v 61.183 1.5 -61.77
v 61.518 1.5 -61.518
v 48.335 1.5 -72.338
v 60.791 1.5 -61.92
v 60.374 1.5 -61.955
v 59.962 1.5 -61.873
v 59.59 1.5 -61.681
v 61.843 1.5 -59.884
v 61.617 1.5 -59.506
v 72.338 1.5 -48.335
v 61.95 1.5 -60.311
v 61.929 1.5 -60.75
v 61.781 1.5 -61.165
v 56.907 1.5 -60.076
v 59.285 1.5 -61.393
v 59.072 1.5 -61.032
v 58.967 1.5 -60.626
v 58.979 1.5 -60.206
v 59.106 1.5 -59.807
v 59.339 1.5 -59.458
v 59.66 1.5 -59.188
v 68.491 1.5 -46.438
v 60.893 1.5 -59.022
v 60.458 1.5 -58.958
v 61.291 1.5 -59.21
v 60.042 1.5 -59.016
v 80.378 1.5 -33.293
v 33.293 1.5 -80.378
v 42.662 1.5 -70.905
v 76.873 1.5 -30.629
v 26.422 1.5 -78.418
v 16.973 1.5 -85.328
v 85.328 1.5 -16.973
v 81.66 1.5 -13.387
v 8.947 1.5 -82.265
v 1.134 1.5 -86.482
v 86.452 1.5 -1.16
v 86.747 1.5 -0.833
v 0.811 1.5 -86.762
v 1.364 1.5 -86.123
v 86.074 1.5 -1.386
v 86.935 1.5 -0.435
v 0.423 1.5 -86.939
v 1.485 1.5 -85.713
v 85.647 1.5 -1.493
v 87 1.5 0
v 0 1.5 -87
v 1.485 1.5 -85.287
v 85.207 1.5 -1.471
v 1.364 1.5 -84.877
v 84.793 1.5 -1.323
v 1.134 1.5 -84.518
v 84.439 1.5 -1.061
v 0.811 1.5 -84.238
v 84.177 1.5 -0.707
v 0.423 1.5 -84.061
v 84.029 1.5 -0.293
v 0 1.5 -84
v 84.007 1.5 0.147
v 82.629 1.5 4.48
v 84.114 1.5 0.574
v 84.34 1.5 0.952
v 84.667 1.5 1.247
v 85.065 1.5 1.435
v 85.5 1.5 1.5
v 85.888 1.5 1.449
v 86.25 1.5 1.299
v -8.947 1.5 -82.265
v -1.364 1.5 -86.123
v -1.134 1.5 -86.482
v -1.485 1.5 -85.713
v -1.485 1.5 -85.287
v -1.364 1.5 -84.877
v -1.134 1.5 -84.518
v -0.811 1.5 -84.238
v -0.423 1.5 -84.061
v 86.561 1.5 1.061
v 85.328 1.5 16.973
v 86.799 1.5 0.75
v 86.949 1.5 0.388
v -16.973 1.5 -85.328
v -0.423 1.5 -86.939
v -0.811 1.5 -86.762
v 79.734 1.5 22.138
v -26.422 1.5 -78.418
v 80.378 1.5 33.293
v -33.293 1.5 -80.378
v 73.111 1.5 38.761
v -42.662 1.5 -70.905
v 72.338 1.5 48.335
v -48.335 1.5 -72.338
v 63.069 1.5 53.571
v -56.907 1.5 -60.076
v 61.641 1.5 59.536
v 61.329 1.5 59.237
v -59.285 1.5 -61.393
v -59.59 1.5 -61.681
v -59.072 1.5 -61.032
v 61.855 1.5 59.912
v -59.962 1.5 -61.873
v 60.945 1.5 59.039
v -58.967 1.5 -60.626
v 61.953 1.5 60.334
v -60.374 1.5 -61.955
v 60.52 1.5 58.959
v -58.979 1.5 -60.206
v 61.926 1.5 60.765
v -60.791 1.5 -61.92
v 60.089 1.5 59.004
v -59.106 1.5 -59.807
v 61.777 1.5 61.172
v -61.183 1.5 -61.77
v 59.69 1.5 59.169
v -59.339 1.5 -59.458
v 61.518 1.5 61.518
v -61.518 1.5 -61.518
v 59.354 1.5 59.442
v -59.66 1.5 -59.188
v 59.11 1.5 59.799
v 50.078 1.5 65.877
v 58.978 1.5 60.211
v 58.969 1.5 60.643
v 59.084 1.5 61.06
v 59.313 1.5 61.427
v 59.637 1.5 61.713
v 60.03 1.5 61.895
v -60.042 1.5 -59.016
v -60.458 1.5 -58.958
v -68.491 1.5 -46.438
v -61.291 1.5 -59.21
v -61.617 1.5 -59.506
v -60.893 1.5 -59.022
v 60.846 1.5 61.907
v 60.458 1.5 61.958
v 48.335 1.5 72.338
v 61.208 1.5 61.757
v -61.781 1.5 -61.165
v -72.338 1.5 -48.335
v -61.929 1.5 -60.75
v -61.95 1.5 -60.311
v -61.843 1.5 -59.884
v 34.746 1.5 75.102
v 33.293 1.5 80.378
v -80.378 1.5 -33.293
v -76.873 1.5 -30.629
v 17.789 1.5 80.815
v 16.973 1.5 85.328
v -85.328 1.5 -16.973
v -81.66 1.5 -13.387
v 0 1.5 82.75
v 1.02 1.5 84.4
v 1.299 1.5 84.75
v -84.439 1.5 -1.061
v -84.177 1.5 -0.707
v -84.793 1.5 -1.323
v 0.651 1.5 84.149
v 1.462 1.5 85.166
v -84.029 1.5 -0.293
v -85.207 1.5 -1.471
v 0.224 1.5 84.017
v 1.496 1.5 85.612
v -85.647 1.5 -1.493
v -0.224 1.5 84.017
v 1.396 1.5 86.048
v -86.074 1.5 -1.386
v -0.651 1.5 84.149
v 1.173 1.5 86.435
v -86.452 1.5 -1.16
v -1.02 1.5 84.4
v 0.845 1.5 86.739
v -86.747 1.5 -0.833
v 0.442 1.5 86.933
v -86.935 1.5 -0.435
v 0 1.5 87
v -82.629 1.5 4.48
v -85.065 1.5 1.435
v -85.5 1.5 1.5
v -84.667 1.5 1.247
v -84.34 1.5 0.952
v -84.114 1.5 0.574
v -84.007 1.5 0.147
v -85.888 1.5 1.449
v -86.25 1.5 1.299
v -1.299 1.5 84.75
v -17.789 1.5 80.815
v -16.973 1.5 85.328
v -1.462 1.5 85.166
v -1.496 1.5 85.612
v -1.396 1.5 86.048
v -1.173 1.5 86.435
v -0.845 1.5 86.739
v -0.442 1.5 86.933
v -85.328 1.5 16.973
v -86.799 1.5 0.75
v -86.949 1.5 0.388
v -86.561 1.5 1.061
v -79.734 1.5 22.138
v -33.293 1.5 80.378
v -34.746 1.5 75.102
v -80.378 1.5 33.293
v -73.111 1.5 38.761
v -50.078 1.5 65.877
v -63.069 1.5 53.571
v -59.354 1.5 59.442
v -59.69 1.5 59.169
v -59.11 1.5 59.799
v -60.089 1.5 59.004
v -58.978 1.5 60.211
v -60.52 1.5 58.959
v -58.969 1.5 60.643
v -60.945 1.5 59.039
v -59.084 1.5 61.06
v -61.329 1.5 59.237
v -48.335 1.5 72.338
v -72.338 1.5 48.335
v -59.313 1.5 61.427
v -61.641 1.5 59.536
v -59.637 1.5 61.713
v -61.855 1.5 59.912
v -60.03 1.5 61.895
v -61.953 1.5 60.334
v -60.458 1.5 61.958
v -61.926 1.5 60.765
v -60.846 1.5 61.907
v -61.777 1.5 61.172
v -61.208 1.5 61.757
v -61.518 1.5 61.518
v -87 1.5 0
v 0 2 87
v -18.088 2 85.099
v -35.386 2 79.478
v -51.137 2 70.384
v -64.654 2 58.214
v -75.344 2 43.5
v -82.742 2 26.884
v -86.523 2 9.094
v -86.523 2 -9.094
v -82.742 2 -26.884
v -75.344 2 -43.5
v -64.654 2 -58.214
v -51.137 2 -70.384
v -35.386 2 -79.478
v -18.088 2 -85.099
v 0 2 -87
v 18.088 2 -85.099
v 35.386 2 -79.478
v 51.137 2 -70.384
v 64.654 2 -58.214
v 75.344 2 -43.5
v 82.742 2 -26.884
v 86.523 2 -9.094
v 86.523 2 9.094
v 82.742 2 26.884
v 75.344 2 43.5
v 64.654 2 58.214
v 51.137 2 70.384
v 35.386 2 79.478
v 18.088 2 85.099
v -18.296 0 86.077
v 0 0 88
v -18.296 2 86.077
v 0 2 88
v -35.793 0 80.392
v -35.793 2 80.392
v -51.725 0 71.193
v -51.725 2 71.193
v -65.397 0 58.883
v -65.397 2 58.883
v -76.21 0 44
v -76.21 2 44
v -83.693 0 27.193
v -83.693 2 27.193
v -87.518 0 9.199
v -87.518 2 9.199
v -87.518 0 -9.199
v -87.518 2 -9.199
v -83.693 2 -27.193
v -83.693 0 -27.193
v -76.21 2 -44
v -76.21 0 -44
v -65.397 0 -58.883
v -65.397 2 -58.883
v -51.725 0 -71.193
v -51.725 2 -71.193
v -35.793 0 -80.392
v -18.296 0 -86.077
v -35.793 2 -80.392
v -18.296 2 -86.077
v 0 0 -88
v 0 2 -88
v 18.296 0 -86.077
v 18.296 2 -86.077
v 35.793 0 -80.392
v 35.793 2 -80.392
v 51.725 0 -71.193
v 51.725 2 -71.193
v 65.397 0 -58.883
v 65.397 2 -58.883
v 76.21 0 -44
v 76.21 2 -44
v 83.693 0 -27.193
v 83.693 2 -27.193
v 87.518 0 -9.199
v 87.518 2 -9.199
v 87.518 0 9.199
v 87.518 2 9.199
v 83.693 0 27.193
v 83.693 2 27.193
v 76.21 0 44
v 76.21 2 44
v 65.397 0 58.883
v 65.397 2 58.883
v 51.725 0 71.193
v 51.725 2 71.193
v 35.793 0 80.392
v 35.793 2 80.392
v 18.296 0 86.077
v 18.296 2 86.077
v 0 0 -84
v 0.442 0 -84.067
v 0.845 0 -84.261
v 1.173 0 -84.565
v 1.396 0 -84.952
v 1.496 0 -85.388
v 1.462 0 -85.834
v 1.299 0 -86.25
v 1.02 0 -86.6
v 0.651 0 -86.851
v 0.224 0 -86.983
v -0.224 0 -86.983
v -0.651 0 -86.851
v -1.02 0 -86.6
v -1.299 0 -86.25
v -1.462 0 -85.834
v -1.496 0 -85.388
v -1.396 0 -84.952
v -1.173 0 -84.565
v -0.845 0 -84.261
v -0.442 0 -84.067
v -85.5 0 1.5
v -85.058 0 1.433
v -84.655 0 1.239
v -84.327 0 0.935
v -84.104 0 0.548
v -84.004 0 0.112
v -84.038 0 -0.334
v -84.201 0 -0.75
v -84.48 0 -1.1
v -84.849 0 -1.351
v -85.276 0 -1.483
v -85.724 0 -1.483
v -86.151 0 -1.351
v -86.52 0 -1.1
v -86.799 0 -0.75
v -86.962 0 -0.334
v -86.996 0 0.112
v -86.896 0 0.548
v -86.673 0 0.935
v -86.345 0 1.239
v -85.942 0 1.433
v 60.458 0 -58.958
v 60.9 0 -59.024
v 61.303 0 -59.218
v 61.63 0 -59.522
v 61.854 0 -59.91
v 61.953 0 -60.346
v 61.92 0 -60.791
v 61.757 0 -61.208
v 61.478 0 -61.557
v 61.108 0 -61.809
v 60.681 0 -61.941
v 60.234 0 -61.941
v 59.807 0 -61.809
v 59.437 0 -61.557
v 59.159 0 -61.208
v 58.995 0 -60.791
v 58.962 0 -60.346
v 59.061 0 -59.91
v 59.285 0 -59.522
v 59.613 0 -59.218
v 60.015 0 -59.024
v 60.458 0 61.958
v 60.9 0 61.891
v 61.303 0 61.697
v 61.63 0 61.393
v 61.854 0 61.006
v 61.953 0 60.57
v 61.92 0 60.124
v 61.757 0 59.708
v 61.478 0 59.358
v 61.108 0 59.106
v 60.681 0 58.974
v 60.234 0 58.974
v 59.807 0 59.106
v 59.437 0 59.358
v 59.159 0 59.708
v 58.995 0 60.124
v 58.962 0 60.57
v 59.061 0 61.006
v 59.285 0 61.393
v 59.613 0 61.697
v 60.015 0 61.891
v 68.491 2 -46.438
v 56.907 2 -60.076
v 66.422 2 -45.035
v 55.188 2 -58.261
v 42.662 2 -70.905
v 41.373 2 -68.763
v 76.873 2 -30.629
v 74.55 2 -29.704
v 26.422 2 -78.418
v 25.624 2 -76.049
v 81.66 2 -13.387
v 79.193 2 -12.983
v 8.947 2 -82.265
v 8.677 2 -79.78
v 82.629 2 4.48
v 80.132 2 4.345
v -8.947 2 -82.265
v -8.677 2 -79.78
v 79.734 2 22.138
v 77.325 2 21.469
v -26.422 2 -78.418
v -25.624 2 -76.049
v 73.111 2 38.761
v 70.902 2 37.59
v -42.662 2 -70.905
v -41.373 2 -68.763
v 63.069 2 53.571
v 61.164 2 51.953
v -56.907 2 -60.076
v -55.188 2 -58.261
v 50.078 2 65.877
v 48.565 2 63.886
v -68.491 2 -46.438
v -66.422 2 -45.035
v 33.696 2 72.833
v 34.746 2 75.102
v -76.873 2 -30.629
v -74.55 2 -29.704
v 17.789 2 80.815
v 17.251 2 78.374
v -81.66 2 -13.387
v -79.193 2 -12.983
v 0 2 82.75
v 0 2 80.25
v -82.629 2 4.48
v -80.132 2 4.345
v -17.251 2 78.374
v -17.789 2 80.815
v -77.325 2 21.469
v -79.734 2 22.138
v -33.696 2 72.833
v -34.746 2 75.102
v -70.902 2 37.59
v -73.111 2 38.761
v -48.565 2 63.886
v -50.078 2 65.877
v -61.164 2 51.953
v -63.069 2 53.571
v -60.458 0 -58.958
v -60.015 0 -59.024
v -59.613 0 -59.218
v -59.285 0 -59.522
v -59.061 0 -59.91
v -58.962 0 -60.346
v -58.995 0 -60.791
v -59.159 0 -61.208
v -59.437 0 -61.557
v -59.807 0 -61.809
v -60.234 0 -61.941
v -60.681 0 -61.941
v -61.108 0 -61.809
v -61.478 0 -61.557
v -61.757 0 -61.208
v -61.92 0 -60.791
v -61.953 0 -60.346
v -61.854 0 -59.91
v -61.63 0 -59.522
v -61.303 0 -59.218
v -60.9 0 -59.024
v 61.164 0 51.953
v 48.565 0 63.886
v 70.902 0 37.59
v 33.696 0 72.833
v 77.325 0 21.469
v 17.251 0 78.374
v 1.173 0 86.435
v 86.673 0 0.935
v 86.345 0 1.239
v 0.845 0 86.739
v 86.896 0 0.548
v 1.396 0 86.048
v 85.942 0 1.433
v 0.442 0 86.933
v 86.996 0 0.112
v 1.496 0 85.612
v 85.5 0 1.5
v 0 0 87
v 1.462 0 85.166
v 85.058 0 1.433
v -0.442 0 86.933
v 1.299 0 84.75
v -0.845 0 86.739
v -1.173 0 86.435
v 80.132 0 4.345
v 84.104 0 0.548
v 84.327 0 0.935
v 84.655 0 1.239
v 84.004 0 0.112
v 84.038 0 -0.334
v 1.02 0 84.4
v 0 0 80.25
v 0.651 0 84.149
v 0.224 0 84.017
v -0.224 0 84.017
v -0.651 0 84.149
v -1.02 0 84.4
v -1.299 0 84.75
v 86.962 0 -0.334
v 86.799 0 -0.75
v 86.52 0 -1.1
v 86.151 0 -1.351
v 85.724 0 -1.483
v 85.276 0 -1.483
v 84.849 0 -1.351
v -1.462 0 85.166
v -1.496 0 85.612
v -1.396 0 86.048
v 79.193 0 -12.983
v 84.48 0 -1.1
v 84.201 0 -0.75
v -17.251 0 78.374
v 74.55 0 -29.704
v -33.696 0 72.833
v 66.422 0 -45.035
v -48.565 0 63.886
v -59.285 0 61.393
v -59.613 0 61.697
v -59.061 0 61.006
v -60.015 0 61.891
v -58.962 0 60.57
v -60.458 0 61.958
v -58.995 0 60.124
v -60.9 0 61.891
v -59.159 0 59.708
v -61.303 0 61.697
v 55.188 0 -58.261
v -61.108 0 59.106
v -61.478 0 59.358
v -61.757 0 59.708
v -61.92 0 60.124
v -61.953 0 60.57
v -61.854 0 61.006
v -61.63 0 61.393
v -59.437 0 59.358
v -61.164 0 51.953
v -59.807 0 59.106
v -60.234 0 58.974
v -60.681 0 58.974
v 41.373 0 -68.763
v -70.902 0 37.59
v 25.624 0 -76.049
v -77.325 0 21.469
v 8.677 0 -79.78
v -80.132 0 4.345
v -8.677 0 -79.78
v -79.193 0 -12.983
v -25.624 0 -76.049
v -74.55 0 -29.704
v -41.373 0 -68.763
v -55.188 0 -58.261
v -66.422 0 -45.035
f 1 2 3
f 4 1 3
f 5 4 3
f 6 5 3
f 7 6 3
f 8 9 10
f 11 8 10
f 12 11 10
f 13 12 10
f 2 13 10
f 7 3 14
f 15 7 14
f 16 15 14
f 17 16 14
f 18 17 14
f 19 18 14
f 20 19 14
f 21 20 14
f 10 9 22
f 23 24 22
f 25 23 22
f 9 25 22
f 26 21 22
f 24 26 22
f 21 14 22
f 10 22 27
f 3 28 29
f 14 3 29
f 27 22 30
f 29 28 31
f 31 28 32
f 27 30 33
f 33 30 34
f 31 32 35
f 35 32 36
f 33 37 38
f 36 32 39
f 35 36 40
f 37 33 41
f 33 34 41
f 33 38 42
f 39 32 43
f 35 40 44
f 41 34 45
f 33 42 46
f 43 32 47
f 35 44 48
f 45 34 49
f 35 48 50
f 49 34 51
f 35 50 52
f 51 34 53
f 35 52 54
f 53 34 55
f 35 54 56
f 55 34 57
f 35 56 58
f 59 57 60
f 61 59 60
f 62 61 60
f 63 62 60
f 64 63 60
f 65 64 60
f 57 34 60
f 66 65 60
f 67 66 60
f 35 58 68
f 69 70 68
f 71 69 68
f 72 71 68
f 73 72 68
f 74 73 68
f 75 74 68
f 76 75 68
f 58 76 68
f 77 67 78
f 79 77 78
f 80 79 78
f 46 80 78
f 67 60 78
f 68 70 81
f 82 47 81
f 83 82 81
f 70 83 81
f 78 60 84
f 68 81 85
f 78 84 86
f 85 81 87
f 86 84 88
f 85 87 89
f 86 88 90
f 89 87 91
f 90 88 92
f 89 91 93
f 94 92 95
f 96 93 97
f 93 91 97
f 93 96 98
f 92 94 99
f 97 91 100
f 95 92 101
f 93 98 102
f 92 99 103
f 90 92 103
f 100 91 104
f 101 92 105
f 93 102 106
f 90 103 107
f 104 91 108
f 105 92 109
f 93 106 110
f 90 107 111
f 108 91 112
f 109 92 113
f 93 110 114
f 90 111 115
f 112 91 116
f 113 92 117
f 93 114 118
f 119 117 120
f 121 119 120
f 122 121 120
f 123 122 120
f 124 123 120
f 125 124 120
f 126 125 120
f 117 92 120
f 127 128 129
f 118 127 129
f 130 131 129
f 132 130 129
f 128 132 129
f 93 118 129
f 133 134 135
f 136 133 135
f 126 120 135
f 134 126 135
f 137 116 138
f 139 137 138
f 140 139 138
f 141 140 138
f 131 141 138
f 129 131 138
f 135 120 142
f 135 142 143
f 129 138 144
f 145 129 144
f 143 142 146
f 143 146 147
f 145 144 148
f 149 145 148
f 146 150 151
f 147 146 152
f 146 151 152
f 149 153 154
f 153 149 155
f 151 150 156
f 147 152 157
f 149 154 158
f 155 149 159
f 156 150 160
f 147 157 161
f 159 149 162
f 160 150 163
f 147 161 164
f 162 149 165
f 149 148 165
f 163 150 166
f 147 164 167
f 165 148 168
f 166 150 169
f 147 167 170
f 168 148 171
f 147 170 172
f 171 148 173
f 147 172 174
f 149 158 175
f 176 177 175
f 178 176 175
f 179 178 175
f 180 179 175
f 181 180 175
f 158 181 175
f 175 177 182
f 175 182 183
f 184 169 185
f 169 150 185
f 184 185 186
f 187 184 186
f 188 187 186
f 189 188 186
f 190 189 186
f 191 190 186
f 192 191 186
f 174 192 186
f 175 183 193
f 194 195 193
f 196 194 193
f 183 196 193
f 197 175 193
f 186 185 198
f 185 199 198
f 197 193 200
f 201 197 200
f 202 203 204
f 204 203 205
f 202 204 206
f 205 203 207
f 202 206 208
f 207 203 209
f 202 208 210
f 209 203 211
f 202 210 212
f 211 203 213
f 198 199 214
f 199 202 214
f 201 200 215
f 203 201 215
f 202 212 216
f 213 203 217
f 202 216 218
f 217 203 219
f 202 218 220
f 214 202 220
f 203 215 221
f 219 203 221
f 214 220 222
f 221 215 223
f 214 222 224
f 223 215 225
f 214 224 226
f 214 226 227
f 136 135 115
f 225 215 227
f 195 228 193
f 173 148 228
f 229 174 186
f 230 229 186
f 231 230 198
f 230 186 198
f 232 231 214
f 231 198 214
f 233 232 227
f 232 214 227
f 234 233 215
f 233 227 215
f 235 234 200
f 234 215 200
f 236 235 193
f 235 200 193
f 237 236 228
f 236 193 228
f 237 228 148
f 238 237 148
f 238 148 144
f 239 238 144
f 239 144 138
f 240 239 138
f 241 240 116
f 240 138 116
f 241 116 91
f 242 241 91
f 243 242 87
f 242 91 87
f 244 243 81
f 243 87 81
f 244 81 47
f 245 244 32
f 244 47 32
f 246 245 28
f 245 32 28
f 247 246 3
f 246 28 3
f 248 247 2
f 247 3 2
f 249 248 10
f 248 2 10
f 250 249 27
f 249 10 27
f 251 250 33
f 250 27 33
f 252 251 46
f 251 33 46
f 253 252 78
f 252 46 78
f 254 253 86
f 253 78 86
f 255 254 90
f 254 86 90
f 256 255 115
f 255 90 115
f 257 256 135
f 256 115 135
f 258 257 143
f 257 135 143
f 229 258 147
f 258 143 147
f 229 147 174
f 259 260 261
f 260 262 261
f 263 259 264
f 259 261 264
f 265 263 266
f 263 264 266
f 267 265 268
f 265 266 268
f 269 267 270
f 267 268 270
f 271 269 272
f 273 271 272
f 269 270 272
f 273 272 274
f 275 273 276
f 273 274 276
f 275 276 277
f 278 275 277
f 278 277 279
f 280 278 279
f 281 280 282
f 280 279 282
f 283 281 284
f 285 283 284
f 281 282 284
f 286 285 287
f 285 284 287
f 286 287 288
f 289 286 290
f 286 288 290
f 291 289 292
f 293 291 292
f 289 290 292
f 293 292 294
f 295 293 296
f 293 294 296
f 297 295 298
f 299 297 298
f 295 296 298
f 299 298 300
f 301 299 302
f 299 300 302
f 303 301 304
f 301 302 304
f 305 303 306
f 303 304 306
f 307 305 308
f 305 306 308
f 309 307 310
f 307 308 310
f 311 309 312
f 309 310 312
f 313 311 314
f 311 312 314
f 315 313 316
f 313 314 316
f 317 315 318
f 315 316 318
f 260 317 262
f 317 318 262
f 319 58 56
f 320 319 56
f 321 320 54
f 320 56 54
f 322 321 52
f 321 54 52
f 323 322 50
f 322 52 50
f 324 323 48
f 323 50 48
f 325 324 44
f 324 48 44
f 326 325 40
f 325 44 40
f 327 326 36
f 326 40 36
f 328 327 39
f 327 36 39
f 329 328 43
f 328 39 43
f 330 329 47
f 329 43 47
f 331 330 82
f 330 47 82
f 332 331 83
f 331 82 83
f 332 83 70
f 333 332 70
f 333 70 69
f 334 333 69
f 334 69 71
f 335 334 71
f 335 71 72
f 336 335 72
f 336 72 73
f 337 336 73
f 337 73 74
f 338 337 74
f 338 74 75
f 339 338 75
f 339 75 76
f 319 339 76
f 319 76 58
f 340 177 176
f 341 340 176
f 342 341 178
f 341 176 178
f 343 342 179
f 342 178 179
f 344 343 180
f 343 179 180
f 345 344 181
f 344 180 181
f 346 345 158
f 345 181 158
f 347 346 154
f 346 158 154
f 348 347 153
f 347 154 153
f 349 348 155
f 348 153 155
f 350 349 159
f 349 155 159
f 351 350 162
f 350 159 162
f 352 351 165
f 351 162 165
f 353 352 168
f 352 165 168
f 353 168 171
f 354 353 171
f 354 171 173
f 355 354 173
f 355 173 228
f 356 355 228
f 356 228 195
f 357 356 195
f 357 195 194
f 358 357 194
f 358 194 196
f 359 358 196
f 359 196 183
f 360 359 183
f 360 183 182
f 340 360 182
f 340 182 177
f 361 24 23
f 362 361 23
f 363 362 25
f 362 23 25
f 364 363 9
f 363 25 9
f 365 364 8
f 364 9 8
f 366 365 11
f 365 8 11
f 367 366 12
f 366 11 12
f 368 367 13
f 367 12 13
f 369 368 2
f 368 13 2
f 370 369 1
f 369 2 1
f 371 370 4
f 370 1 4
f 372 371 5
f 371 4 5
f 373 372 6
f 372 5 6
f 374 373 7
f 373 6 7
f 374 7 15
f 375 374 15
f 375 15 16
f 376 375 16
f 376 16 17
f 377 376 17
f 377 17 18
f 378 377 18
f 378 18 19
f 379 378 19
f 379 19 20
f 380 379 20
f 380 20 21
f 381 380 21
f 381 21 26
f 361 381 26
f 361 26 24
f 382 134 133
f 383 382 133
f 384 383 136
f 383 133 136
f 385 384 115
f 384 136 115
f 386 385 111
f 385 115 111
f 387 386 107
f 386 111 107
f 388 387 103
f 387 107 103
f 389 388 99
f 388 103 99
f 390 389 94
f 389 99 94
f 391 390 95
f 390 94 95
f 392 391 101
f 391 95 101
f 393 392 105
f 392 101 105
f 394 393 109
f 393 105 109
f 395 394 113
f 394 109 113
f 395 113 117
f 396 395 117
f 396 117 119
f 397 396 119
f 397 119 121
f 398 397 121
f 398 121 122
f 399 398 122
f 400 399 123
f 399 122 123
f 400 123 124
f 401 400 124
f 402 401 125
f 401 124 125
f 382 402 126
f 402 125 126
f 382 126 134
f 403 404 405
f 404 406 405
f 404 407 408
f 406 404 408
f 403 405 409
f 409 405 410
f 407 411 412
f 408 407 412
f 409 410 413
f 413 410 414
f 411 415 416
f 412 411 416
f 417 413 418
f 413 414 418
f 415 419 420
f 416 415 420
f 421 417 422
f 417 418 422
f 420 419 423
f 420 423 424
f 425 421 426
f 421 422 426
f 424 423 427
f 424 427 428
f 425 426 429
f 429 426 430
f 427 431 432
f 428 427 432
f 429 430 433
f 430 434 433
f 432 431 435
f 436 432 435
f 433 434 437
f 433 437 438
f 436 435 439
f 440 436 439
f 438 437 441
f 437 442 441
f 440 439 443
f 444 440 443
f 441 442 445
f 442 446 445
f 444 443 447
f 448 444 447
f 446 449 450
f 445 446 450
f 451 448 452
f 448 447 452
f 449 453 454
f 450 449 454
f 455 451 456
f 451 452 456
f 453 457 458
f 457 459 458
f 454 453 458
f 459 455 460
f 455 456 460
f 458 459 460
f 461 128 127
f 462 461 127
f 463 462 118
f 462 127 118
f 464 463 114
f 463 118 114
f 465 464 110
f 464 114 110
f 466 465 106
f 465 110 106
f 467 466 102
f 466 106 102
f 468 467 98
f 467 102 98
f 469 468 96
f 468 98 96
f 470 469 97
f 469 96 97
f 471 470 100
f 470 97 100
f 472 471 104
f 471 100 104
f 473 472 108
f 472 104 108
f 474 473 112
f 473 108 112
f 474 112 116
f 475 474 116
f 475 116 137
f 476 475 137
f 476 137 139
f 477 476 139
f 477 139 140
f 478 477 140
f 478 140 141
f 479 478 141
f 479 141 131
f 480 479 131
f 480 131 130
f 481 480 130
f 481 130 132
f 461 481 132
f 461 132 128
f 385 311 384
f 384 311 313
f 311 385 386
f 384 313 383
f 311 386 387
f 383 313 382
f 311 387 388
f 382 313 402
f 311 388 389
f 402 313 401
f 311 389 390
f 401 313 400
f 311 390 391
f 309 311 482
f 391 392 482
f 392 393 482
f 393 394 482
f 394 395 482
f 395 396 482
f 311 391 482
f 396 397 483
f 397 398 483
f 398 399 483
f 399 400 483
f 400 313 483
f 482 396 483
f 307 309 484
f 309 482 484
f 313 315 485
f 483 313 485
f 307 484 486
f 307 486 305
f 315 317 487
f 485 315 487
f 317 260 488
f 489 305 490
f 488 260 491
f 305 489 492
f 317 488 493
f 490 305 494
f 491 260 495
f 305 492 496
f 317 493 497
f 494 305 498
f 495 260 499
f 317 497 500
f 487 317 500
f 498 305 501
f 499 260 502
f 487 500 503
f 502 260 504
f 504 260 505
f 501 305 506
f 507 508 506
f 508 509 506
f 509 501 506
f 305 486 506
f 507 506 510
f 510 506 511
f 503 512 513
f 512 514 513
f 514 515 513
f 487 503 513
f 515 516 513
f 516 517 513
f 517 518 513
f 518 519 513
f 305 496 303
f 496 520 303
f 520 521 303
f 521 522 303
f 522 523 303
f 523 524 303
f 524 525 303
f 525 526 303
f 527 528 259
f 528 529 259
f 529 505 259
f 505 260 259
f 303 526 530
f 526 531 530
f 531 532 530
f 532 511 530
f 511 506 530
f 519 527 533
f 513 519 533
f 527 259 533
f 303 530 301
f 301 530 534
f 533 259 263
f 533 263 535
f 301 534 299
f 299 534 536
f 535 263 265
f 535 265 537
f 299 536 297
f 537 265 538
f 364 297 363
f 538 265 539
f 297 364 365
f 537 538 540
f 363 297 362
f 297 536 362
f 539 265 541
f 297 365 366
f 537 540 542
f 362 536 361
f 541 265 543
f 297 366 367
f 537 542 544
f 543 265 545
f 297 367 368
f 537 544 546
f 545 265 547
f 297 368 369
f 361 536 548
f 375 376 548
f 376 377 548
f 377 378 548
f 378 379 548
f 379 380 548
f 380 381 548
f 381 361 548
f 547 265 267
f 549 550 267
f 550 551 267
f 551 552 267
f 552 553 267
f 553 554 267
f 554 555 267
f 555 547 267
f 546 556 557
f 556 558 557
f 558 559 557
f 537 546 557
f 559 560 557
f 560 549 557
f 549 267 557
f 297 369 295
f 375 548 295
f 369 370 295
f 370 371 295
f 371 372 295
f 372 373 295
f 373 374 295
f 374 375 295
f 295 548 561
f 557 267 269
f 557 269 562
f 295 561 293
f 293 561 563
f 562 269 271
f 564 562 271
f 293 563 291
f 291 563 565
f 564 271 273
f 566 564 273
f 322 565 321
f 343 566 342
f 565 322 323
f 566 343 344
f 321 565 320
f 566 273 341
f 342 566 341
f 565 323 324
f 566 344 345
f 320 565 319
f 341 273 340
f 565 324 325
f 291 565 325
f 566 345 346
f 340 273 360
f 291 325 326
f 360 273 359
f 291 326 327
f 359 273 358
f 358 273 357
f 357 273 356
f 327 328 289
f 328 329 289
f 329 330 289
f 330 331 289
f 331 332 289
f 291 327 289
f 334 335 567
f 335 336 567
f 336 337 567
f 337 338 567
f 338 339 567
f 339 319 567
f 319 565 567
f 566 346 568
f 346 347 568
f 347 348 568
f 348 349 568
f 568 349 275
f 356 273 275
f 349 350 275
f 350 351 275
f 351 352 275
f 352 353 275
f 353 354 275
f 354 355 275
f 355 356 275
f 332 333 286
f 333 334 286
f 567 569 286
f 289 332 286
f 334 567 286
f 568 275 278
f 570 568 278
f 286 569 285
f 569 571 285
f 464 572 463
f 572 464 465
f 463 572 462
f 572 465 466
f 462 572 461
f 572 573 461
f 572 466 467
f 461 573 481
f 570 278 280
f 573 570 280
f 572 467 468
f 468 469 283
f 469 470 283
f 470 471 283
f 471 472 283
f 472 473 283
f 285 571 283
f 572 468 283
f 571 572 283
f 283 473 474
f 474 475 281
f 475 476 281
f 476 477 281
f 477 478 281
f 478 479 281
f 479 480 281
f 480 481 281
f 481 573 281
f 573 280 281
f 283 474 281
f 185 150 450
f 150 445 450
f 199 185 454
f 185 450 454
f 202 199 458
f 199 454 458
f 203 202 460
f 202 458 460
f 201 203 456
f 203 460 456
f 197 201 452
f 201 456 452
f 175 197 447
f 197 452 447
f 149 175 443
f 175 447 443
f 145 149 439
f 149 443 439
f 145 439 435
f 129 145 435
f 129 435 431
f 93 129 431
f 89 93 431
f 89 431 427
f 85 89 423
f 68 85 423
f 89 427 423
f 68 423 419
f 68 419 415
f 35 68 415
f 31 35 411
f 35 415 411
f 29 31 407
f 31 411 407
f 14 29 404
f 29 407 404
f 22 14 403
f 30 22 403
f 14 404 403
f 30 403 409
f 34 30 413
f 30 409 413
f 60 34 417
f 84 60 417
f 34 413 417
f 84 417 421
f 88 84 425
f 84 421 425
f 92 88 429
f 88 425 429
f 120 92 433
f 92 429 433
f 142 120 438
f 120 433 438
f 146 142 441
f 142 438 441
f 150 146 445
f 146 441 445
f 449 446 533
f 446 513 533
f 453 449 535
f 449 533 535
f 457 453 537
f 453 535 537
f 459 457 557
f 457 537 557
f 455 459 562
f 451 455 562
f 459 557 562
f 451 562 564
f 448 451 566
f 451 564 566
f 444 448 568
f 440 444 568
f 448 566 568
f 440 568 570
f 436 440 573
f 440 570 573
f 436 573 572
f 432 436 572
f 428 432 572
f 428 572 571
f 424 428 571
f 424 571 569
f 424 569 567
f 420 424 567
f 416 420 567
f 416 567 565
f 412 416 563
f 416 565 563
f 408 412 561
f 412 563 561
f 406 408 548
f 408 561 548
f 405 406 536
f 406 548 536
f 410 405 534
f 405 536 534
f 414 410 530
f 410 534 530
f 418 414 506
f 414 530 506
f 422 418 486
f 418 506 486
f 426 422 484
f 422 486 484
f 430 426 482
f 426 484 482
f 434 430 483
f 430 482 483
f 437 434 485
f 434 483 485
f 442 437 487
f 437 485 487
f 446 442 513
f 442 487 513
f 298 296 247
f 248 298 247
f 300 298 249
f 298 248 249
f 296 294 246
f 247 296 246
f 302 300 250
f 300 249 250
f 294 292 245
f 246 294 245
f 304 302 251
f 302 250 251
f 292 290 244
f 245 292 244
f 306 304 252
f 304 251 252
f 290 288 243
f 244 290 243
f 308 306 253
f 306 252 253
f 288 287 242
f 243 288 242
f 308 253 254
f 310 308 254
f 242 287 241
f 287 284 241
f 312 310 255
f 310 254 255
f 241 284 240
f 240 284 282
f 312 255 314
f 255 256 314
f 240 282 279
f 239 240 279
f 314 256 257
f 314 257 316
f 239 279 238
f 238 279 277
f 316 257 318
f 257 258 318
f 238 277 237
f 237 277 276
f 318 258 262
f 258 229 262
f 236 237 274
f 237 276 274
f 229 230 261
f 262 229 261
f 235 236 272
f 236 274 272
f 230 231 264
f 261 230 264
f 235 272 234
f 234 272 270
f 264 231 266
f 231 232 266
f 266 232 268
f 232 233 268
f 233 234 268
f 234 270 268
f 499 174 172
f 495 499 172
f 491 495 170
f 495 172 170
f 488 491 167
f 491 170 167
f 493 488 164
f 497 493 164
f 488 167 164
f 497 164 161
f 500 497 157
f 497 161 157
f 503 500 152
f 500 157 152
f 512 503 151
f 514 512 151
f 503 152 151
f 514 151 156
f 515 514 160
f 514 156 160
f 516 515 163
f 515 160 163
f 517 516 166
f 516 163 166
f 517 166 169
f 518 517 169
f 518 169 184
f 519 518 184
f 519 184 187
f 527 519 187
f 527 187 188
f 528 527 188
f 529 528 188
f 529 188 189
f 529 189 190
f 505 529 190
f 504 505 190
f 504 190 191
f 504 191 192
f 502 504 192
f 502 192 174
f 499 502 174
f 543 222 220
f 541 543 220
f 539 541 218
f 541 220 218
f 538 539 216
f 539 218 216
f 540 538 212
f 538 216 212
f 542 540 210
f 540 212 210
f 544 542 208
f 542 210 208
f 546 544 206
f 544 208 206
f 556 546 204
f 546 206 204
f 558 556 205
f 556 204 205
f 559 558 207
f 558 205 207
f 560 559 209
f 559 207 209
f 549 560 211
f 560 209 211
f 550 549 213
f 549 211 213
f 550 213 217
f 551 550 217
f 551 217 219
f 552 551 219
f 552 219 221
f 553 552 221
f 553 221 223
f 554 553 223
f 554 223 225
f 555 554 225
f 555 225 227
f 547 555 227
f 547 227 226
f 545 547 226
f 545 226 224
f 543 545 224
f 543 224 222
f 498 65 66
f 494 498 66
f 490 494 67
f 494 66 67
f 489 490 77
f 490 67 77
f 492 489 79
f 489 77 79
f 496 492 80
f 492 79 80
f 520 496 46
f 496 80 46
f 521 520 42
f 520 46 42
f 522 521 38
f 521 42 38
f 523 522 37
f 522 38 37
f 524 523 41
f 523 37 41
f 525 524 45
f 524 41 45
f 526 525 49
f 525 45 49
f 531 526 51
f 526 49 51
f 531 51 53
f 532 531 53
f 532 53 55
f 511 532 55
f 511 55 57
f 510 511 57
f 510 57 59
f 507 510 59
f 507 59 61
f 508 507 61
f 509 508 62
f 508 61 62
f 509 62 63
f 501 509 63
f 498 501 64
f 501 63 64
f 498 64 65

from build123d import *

# Parameters (mm, degrees)
SKETCH_2_R          = 1.5
CUT_EXTRUDE_1_DEPTH = 125.459832878


with BuildPart() as part:
    # 草图1 → 旋转1 (revolve)
    with BuildSketch(Plane.XY, mode=Mode.PRIVATE) as revolve_1_sk:
        Polygon((80.25, 0), (88, 0), (88, 2), (87, 2), (87, 1.5), (82.75, 1.5), (82.75, 2), (80.25, 2), align=None)
    revolve(revolve_1_sk.sketch.rotate(Axis((0, 155.597353718, 0), (0, -1, 0)), 90), axis=Axis((0, 155.597353718, 0), (0, -1, 0)))

    # 草图2 → 切除-拉伸1 (cut, through all)
    with BuildSketch(Plane(origin=(0, 1.5, 0), x_dir=(1, 0, 0), z_dir=(0, 1, 0))):
        with Locations(Location((0, 85.5, 0), (0, 0, 270))):
            Circle(SKETCH_2_R)
        with Locations(Location((60.457629791, 60.457629791, 0), (0, 0, 270))):
            Circle(SKETCH_2_R)
        with Locations(Location((85.5, 0, 0), (0, 0, 270))):
            Circle(SKETCH_2_R)
        with Locations(Location((60.457629791, -60.457629791, 0), (0, 0, 270))):
            Circle(SKETCH_2_R)
        with Locations(Location((0, -85.5, 0), (0, 0, 270))):
            Circle(SKETCH_2_R)
        with Locations(Location((-60.457629791, -60.457629791, 0), (0, 0, 270))):
            Circle(SKETCH_2_R)
        with Locations(Location((-85.5, 0, 0), (0, 0, 270))):
            Circle(SKETCH_2_R)
        with Locations(Location((-60.457629791, 60.457629791, 0), (0, 0, 270))):
            Circle(SKETCH_2_R)
    extrude(amount=-CUT_EXTRUDE_1_DEPTH, mode=Mode.SUBTRACT)


solid = part.part
